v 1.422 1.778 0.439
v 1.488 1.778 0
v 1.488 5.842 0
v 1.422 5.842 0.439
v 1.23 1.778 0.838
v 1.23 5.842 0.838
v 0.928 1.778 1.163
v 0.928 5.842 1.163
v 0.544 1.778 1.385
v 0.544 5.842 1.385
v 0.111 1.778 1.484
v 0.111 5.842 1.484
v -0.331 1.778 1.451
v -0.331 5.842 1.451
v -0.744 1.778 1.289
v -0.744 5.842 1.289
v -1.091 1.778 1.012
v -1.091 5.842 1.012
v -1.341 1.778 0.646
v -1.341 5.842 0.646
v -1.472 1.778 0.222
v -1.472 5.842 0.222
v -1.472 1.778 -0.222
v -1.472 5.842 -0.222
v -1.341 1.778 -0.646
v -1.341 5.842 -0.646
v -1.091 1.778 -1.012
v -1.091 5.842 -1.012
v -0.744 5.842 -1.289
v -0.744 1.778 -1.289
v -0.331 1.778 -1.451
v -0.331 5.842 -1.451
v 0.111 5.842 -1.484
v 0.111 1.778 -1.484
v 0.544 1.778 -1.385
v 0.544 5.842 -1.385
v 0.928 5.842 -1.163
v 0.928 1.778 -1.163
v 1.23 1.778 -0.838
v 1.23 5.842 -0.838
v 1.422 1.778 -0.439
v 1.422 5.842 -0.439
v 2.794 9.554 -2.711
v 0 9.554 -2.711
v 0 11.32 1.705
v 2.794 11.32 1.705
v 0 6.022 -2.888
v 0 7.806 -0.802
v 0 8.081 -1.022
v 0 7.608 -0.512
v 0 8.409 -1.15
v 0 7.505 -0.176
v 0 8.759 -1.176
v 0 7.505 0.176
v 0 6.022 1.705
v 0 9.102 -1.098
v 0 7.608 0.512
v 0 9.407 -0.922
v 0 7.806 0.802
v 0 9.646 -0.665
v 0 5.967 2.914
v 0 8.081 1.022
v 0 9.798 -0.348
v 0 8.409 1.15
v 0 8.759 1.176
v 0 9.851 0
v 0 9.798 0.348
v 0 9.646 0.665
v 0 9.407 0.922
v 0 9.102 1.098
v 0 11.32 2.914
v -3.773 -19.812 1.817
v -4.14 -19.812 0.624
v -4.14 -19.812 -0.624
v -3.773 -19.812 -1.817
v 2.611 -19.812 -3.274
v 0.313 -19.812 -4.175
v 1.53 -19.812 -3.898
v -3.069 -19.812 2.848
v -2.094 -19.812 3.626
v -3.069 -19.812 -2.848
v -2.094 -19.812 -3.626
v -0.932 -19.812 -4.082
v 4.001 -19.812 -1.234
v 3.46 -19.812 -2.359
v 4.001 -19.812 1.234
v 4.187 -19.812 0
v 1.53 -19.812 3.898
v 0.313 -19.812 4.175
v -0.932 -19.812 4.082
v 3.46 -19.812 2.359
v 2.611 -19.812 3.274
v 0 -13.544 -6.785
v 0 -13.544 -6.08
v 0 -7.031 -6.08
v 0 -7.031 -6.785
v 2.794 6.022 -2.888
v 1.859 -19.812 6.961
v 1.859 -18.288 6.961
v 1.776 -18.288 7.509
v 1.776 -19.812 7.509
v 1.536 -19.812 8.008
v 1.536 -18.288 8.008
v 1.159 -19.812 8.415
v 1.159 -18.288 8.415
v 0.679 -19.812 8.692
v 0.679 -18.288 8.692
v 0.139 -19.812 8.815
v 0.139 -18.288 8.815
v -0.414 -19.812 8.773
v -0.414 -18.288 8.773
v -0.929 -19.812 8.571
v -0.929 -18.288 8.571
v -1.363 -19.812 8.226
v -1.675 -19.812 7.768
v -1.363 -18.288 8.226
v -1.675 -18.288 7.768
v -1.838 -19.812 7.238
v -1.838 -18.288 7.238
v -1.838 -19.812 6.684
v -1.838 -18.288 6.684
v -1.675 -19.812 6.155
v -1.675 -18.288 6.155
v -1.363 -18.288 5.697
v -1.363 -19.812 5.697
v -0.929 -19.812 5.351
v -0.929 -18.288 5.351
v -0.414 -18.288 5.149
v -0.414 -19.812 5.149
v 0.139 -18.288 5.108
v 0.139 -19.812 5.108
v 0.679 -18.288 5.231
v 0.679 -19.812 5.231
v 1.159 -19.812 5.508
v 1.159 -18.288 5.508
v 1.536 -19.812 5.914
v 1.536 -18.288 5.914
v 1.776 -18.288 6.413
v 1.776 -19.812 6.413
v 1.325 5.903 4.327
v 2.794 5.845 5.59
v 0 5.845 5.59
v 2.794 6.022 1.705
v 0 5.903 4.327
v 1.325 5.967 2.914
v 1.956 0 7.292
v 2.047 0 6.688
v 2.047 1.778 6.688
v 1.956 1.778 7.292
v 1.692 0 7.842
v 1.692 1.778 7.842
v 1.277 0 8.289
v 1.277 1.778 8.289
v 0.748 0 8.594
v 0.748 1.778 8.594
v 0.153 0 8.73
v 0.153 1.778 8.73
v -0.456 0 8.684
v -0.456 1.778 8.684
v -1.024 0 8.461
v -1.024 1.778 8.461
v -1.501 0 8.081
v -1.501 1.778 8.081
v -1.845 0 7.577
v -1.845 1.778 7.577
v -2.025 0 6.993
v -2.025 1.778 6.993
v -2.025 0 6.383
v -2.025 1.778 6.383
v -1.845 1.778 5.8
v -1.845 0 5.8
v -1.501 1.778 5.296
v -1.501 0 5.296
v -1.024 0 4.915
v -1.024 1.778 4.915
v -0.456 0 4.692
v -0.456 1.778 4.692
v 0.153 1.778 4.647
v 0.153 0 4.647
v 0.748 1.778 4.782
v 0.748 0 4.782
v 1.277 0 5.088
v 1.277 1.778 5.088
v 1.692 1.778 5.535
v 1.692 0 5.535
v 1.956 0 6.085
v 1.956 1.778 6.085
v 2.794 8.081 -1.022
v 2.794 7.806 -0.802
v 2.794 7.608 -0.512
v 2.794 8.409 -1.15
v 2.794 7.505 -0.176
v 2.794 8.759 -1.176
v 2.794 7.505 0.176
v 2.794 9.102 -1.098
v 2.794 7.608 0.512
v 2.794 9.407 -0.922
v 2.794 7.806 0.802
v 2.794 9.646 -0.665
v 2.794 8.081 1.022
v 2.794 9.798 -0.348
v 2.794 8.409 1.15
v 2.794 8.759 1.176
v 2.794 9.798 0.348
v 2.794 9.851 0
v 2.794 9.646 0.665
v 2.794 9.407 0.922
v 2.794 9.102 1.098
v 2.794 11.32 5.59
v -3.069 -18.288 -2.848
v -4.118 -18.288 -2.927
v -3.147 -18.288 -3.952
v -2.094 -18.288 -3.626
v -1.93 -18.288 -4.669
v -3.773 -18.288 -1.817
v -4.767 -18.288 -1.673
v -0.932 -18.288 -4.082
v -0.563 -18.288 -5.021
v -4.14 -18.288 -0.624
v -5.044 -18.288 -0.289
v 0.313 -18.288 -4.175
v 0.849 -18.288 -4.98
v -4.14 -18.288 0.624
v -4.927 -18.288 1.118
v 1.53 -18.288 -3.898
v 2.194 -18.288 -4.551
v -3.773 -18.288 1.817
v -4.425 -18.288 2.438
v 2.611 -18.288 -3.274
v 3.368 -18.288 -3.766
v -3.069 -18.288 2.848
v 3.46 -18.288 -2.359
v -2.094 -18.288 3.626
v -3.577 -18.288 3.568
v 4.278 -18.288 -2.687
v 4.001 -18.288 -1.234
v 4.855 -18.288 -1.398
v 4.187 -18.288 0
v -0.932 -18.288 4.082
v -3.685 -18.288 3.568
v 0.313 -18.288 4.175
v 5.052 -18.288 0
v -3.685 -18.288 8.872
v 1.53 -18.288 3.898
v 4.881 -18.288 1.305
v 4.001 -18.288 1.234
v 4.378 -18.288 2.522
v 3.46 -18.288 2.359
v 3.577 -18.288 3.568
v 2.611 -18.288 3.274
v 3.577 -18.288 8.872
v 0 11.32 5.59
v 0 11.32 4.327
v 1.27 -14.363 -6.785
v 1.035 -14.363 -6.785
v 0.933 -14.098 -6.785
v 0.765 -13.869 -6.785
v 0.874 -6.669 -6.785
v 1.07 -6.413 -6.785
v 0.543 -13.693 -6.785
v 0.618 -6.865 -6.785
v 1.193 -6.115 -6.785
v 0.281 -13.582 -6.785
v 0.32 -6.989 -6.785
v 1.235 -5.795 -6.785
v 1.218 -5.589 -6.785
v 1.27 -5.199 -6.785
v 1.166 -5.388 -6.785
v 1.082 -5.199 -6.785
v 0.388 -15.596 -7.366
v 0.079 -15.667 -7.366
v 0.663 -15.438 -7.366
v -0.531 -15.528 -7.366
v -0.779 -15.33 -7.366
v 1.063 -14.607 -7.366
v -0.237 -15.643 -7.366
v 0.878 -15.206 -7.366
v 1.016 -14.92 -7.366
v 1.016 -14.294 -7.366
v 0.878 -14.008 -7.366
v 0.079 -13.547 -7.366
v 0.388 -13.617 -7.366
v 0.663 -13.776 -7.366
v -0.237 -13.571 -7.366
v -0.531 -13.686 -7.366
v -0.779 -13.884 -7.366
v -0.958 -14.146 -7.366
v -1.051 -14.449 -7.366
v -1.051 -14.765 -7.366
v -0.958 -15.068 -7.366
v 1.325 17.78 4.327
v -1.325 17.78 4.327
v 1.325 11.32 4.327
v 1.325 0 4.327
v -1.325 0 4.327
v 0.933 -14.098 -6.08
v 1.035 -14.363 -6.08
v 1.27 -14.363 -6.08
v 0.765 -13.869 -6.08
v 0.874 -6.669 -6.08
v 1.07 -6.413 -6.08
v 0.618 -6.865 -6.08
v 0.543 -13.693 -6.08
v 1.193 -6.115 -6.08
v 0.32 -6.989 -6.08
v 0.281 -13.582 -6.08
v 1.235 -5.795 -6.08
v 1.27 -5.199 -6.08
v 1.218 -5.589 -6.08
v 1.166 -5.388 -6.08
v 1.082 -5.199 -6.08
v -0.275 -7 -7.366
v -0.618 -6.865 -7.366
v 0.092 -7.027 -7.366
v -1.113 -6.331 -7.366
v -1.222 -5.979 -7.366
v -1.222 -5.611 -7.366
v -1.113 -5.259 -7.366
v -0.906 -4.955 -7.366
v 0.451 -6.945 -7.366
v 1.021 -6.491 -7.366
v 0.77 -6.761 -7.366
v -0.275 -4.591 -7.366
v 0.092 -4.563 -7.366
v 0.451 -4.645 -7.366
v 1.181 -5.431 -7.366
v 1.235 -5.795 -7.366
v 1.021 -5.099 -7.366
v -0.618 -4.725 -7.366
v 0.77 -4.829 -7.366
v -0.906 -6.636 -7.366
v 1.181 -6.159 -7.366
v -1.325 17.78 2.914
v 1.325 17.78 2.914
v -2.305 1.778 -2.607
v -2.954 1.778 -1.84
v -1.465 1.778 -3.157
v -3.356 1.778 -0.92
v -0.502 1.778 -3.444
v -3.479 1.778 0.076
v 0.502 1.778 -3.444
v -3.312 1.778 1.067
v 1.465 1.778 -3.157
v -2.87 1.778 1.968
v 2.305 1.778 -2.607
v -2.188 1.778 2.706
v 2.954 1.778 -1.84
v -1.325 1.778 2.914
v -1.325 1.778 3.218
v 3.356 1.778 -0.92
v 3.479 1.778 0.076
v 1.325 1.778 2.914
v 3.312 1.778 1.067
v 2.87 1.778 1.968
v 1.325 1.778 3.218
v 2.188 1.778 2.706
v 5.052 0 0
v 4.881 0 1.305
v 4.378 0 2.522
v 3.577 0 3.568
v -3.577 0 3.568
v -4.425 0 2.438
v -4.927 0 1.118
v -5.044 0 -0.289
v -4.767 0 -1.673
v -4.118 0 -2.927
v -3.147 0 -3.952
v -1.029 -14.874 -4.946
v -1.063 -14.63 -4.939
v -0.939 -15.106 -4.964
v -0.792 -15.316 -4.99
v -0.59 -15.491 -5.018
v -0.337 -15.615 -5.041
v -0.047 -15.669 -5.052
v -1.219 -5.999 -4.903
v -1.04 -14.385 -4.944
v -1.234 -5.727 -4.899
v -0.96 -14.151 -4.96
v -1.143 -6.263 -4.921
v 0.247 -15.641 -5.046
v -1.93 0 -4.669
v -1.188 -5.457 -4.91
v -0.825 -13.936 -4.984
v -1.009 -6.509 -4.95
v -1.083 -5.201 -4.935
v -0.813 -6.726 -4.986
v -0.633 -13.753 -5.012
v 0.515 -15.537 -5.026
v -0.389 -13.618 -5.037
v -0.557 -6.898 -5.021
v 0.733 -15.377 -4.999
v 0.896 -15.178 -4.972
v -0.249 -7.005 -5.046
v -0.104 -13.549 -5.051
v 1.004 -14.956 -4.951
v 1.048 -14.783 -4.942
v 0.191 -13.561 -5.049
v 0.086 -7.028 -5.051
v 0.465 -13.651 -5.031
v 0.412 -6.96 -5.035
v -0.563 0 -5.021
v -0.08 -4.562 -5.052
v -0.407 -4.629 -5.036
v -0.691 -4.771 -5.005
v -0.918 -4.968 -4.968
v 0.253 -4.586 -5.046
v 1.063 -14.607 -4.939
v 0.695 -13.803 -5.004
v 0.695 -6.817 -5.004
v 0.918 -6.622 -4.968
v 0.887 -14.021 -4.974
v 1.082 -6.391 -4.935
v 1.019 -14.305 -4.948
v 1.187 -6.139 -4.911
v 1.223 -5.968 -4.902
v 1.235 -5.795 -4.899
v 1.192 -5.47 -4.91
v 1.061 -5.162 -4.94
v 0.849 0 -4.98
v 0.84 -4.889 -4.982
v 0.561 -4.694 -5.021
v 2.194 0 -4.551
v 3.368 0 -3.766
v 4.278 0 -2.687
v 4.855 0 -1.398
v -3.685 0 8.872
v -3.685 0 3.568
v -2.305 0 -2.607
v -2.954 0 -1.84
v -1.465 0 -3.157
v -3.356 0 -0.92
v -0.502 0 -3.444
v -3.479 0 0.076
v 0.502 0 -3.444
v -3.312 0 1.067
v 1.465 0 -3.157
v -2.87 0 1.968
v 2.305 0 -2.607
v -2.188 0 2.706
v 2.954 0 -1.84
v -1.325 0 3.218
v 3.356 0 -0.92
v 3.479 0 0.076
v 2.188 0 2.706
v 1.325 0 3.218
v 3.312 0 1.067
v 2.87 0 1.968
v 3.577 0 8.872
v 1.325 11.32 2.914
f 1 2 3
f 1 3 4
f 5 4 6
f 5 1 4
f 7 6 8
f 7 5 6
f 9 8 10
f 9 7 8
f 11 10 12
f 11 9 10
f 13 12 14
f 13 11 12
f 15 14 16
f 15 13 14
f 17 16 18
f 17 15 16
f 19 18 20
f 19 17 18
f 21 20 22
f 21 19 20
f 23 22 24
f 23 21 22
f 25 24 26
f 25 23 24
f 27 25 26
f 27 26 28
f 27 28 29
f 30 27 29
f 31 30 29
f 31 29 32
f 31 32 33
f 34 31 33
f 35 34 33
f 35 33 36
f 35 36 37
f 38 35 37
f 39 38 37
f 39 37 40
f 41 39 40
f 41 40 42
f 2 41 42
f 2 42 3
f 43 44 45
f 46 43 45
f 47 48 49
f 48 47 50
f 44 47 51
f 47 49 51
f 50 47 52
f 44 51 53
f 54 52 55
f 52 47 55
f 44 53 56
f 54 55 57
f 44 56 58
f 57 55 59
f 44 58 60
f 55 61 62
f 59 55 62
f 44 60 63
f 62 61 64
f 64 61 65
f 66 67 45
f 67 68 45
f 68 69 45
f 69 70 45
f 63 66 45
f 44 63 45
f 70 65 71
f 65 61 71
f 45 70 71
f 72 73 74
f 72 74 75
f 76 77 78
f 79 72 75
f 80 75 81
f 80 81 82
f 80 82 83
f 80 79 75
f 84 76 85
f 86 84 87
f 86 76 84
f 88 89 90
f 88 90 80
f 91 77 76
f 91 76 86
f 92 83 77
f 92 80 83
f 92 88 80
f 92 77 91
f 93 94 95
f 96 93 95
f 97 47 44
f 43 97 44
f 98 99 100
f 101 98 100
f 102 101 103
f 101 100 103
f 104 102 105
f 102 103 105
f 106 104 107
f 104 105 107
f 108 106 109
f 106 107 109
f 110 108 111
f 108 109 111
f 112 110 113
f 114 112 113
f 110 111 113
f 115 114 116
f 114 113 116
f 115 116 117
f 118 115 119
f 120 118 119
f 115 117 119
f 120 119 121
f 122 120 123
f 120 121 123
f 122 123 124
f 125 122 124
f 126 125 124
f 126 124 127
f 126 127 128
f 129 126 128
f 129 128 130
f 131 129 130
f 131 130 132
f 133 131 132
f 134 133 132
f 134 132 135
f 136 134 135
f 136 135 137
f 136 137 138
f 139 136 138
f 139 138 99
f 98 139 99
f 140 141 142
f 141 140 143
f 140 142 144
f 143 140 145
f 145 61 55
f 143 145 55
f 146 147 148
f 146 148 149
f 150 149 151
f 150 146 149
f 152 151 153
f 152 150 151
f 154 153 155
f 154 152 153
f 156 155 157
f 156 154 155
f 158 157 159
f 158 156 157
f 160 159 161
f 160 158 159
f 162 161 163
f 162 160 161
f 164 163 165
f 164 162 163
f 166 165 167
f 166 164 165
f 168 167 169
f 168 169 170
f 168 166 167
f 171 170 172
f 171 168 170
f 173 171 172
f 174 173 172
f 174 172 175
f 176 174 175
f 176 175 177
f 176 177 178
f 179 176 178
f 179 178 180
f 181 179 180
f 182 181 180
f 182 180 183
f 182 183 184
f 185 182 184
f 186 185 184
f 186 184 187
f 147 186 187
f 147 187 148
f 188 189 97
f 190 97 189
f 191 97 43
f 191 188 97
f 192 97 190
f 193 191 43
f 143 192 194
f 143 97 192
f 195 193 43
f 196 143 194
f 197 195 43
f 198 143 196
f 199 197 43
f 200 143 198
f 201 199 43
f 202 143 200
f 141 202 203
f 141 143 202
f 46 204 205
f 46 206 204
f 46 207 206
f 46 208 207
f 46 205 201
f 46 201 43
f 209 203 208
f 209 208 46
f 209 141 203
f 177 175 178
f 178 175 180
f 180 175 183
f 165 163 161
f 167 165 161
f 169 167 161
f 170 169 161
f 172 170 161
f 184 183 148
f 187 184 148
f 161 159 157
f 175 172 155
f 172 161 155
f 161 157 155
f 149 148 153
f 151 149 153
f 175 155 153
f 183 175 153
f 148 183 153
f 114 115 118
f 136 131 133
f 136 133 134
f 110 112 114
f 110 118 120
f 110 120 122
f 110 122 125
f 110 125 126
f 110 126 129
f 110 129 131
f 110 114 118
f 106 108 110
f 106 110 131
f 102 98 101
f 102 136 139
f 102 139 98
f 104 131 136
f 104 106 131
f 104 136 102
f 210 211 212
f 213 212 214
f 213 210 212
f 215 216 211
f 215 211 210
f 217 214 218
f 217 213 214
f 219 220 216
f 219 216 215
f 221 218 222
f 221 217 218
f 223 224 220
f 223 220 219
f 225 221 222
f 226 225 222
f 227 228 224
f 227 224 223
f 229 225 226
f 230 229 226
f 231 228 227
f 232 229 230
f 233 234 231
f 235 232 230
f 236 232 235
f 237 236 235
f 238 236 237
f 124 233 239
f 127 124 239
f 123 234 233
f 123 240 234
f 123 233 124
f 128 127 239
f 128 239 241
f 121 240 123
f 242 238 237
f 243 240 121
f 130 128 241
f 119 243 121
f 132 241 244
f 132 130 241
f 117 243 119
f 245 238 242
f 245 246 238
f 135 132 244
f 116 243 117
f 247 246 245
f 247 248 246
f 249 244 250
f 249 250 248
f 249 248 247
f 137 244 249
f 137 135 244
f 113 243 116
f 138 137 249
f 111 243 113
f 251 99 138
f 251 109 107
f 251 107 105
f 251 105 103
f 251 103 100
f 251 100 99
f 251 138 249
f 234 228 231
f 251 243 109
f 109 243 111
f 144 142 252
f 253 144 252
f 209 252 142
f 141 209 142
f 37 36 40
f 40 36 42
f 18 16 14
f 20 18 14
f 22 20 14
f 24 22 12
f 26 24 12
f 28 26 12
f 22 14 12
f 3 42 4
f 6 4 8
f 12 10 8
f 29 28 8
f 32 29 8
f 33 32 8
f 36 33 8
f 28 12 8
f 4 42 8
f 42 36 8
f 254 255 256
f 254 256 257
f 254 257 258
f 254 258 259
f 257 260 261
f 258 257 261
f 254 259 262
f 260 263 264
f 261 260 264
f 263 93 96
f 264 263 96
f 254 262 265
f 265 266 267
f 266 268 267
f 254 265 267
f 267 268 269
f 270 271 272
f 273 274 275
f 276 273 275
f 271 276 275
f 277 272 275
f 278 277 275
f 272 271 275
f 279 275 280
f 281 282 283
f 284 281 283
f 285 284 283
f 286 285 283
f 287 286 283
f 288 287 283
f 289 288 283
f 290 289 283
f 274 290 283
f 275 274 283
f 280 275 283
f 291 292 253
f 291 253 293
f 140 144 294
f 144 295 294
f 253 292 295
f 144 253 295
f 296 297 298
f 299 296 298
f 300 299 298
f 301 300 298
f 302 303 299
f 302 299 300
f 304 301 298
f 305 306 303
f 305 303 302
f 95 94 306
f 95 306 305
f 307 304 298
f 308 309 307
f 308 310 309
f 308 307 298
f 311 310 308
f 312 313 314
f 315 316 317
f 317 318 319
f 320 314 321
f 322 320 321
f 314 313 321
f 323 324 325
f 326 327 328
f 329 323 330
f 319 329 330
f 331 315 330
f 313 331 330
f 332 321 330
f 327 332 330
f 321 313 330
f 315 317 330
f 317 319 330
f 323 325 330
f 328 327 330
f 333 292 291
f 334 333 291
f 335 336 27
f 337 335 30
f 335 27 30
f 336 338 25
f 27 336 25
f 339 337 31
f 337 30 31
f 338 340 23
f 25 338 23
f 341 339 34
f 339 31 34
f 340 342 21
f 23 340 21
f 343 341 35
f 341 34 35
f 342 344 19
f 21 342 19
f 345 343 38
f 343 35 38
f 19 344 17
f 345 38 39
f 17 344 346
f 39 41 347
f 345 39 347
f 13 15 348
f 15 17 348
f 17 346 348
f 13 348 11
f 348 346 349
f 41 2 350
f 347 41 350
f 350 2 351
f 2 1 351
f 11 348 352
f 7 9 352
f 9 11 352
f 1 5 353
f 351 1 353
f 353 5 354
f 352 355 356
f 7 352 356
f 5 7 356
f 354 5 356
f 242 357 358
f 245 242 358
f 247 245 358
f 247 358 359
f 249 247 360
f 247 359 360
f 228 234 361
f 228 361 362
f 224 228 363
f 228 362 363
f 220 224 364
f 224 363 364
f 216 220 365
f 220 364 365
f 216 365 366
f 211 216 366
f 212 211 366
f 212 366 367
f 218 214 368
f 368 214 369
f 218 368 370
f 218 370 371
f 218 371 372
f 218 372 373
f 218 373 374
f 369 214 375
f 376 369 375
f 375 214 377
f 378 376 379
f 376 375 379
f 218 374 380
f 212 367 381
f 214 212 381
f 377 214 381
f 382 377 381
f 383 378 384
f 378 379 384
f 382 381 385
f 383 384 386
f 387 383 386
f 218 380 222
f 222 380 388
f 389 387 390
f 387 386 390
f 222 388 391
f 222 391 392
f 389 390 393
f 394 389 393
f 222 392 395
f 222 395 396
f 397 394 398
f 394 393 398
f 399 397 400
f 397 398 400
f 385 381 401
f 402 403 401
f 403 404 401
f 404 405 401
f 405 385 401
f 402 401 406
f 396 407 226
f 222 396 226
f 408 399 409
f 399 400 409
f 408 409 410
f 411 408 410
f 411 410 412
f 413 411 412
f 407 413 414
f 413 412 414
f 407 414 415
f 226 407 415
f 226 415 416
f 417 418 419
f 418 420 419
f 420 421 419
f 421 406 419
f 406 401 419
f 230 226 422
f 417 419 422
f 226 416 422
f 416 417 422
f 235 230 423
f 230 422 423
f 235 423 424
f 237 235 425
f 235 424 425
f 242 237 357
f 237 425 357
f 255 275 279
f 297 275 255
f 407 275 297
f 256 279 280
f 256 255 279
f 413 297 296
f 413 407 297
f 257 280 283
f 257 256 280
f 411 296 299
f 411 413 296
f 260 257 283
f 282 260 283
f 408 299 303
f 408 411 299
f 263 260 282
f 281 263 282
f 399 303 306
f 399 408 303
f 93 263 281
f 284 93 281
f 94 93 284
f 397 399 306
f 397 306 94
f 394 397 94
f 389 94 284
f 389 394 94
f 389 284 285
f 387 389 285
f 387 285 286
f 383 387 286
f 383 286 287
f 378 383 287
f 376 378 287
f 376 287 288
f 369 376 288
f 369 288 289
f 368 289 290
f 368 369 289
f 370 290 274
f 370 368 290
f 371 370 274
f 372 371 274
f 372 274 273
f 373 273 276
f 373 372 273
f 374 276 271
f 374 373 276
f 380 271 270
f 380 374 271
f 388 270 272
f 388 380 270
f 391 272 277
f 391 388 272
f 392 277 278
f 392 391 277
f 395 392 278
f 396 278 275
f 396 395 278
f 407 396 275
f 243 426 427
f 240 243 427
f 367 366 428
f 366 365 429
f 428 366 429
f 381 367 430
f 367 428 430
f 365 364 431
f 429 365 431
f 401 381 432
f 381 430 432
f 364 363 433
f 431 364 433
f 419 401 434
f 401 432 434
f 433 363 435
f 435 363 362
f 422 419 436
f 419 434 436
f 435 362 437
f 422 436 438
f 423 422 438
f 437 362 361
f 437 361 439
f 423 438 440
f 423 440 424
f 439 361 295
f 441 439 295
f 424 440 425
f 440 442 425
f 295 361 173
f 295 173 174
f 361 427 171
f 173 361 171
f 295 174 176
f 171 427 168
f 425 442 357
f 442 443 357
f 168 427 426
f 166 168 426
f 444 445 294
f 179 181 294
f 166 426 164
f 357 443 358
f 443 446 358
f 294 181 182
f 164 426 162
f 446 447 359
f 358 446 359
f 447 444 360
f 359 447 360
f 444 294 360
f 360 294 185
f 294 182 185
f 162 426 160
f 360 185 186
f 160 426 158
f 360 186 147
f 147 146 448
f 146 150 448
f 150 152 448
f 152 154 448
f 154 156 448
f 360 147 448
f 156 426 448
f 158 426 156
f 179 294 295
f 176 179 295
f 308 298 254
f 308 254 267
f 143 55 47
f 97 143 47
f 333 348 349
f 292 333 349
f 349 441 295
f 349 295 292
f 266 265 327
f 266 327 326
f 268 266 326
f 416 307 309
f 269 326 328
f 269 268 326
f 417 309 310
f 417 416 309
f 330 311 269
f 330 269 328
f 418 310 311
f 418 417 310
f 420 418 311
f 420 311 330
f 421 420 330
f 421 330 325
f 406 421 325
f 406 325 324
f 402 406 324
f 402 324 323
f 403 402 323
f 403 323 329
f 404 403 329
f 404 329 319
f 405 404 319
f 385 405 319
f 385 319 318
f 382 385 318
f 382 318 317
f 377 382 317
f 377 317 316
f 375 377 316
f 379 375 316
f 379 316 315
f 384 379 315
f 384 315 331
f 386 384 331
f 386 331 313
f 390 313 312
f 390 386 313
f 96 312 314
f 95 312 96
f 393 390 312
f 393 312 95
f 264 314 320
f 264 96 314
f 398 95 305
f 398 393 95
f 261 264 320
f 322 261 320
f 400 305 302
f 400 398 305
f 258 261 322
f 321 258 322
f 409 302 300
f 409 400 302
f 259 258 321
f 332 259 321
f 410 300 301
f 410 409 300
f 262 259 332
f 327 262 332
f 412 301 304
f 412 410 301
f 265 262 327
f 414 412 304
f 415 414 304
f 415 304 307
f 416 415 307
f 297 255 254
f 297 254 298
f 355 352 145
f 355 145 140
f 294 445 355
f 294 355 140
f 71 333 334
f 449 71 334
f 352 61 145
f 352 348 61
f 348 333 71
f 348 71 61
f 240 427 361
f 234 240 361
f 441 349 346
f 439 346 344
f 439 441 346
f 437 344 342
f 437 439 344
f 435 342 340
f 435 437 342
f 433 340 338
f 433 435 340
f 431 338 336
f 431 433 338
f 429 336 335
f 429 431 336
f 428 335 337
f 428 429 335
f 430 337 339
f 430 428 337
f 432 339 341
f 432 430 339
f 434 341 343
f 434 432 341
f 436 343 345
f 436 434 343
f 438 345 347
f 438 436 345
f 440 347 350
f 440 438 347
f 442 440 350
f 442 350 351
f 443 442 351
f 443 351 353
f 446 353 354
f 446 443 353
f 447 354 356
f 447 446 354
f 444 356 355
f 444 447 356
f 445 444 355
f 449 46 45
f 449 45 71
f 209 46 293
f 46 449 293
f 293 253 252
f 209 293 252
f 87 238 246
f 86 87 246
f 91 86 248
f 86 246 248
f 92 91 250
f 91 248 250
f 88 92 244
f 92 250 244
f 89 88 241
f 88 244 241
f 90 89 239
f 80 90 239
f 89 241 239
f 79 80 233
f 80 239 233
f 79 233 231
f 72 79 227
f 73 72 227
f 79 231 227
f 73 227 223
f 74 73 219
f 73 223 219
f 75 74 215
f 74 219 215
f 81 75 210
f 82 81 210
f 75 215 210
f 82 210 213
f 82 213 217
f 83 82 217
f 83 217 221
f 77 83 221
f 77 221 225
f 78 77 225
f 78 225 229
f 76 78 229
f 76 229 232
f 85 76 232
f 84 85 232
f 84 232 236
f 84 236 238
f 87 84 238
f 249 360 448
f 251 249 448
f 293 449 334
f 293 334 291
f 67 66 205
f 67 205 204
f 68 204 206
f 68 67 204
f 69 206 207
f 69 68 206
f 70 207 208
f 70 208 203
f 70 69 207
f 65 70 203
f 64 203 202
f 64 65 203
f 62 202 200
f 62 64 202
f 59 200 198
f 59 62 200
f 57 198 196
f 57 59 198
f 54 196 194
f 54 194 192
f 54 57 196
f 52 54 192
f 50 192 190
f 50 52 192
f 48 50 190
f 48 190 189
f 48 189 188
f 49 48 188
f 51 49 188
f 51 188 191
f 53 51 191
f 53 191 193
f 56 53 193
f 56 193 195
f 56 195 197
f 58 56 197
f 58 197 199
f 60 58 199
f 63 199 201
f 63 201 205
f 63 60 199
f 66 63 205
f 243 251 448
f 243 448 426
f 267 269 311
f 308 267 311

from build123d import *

# Parameters (mm, degrees)
F1_DEPTH  = 18.288
F2_R      = 3.4799850438
F2_R_2    = 2.0474430639
F3_DEPTH  = 1.778
F4_R      = 4.1871679965
F4_R_2    = 1.8588242599
F5_DEPTH  = 19.812
F6_R      = 1.062986484
F6_R_2    = 1.2354744031
F7_DEPTH  = 7.366
F8_W      = 9.1641424224
F8_H      = 0.7049338892
F9_DEPTH  = 1.27
F10_W     = 2.6493370533
F10_H     = 1.4129802585
F11_DEPTH = 17.78
F12_R     = 1.1796889781
F13_DEPTH = 2.794
F14_R     = 1.4881662005
F15_DEPTH = 5.842


with BuildPart() as f1:
    # F0 (on Front) → F1 (new body)
    with BuildSketch(Plane.XZ):
        with BuildLine():
            ThreePointArc((-3.577367444, 3.5675205461), (-1.9301777364, -4.6689586186), (5.0522035466, 0))
            ThreePointArc((5.0522035466, 0), (4.6689586186, 1.9301777364), (3.577367444, 3.5675205461))
            Line((3.577367444, 3.5675205461), (-3.577367444, 3.5675205461))
        make_face()
        with BuildLine():
            Line((-3.577367444, 3.5675205461), (3.577367444, 3.5675205461))
            ThreePointArc((3.577367444, 3.5675205461), (0, 5.0522035466), (-3.577367444, 3.5675205461))
        make_face()
        with BuildLine():
            ThreePointArc((-3.577367444, 3.5675205461), (0, 5.0522035466), (3.577367444, 3.5675205461))
            Line((3.577367444, 3.5675205461), (3.577367444, 8.872252889))
            Line((3.577367444, 8.872252889), (-3.6853936035, 8.872252889))
            Line((-3.6853936035, 8.872252889), (-3.6853936035, 3.5675205461))
            Line((-3.6853936035, 3.5675205461), (-3.577367444, 3.5675205461))
        make_face()
    extrude(amount=F1_DEPTH)

    # F2 (on Front) → F3 (join)
    with BuildSketch(Plane.XZ):
        Circle(F2_R)
        with Locations((0, 6.6883149557)):
            Circle(F2_R_2)
    extrude(amount=-F3_DEPTH)

    # F4 (on Front) → F5 (join)
    with BuildSketch(Plane.XZ):
        Circle(F4_R)
        with Locations((0, 6.961222738)):
            Circle(F4_R_2)
    extrude(amount=F5_DEPTH)

    # F6 (on Top) → F7 (join)
    with BuildSketch(Plane.XY):
        with Locations((0, -14.6069657058)):
            Circle(F6_R)
        with Locations((0, -5.7952911593)):
            Circle(F6_R_2)
    extrude(amount=-F7_DEPTH)

    # F8 (on Right) → F9 (join)
    with BuildSketch(Plane.YZ):
        with Locations((-9.7809578292, -6.4325220883)):
            Rectangle(F8_W, F8_H)
    extrude(amount=F9_DEPTH)

    # F10 (on Front) → F11 (join)
    with BuildSketch(Plane.XZ):
        with Locations((0, 3.6207614467)):
            Rectangle(F10_W, F10_H)
    extrude(amount=-F11_DEPTH)

    # F12 (on Right) → F13 (join)
    with BuildSketch(Plane.YZ):
        Polygon((11.320493184, 5.5902907625), (5.8451956138, 5.5902907625), (6.0218176804, 1.7045951681), (11.320493184, 1.7045951681), align=None)
        Polygon((11.320493184, 1.7045951681), (6.0218176804, 1.7045951681), (6.0218176804, -2.8875903226), (9.5542669296, -2.7109677903), align=None)
        with Locations((8.6711554322, 0)):
            Circle(F12_R, mode=Mode.SUBTRACT)
    extrude(amount=F13_DEPTH)

    # F14 (on Front) → F15 (join)
    with BuildSketch(Plane.XZ):
        Circle(F14_R)
    extrude(amount=-F15_DEPTH)


solid = f1.part
